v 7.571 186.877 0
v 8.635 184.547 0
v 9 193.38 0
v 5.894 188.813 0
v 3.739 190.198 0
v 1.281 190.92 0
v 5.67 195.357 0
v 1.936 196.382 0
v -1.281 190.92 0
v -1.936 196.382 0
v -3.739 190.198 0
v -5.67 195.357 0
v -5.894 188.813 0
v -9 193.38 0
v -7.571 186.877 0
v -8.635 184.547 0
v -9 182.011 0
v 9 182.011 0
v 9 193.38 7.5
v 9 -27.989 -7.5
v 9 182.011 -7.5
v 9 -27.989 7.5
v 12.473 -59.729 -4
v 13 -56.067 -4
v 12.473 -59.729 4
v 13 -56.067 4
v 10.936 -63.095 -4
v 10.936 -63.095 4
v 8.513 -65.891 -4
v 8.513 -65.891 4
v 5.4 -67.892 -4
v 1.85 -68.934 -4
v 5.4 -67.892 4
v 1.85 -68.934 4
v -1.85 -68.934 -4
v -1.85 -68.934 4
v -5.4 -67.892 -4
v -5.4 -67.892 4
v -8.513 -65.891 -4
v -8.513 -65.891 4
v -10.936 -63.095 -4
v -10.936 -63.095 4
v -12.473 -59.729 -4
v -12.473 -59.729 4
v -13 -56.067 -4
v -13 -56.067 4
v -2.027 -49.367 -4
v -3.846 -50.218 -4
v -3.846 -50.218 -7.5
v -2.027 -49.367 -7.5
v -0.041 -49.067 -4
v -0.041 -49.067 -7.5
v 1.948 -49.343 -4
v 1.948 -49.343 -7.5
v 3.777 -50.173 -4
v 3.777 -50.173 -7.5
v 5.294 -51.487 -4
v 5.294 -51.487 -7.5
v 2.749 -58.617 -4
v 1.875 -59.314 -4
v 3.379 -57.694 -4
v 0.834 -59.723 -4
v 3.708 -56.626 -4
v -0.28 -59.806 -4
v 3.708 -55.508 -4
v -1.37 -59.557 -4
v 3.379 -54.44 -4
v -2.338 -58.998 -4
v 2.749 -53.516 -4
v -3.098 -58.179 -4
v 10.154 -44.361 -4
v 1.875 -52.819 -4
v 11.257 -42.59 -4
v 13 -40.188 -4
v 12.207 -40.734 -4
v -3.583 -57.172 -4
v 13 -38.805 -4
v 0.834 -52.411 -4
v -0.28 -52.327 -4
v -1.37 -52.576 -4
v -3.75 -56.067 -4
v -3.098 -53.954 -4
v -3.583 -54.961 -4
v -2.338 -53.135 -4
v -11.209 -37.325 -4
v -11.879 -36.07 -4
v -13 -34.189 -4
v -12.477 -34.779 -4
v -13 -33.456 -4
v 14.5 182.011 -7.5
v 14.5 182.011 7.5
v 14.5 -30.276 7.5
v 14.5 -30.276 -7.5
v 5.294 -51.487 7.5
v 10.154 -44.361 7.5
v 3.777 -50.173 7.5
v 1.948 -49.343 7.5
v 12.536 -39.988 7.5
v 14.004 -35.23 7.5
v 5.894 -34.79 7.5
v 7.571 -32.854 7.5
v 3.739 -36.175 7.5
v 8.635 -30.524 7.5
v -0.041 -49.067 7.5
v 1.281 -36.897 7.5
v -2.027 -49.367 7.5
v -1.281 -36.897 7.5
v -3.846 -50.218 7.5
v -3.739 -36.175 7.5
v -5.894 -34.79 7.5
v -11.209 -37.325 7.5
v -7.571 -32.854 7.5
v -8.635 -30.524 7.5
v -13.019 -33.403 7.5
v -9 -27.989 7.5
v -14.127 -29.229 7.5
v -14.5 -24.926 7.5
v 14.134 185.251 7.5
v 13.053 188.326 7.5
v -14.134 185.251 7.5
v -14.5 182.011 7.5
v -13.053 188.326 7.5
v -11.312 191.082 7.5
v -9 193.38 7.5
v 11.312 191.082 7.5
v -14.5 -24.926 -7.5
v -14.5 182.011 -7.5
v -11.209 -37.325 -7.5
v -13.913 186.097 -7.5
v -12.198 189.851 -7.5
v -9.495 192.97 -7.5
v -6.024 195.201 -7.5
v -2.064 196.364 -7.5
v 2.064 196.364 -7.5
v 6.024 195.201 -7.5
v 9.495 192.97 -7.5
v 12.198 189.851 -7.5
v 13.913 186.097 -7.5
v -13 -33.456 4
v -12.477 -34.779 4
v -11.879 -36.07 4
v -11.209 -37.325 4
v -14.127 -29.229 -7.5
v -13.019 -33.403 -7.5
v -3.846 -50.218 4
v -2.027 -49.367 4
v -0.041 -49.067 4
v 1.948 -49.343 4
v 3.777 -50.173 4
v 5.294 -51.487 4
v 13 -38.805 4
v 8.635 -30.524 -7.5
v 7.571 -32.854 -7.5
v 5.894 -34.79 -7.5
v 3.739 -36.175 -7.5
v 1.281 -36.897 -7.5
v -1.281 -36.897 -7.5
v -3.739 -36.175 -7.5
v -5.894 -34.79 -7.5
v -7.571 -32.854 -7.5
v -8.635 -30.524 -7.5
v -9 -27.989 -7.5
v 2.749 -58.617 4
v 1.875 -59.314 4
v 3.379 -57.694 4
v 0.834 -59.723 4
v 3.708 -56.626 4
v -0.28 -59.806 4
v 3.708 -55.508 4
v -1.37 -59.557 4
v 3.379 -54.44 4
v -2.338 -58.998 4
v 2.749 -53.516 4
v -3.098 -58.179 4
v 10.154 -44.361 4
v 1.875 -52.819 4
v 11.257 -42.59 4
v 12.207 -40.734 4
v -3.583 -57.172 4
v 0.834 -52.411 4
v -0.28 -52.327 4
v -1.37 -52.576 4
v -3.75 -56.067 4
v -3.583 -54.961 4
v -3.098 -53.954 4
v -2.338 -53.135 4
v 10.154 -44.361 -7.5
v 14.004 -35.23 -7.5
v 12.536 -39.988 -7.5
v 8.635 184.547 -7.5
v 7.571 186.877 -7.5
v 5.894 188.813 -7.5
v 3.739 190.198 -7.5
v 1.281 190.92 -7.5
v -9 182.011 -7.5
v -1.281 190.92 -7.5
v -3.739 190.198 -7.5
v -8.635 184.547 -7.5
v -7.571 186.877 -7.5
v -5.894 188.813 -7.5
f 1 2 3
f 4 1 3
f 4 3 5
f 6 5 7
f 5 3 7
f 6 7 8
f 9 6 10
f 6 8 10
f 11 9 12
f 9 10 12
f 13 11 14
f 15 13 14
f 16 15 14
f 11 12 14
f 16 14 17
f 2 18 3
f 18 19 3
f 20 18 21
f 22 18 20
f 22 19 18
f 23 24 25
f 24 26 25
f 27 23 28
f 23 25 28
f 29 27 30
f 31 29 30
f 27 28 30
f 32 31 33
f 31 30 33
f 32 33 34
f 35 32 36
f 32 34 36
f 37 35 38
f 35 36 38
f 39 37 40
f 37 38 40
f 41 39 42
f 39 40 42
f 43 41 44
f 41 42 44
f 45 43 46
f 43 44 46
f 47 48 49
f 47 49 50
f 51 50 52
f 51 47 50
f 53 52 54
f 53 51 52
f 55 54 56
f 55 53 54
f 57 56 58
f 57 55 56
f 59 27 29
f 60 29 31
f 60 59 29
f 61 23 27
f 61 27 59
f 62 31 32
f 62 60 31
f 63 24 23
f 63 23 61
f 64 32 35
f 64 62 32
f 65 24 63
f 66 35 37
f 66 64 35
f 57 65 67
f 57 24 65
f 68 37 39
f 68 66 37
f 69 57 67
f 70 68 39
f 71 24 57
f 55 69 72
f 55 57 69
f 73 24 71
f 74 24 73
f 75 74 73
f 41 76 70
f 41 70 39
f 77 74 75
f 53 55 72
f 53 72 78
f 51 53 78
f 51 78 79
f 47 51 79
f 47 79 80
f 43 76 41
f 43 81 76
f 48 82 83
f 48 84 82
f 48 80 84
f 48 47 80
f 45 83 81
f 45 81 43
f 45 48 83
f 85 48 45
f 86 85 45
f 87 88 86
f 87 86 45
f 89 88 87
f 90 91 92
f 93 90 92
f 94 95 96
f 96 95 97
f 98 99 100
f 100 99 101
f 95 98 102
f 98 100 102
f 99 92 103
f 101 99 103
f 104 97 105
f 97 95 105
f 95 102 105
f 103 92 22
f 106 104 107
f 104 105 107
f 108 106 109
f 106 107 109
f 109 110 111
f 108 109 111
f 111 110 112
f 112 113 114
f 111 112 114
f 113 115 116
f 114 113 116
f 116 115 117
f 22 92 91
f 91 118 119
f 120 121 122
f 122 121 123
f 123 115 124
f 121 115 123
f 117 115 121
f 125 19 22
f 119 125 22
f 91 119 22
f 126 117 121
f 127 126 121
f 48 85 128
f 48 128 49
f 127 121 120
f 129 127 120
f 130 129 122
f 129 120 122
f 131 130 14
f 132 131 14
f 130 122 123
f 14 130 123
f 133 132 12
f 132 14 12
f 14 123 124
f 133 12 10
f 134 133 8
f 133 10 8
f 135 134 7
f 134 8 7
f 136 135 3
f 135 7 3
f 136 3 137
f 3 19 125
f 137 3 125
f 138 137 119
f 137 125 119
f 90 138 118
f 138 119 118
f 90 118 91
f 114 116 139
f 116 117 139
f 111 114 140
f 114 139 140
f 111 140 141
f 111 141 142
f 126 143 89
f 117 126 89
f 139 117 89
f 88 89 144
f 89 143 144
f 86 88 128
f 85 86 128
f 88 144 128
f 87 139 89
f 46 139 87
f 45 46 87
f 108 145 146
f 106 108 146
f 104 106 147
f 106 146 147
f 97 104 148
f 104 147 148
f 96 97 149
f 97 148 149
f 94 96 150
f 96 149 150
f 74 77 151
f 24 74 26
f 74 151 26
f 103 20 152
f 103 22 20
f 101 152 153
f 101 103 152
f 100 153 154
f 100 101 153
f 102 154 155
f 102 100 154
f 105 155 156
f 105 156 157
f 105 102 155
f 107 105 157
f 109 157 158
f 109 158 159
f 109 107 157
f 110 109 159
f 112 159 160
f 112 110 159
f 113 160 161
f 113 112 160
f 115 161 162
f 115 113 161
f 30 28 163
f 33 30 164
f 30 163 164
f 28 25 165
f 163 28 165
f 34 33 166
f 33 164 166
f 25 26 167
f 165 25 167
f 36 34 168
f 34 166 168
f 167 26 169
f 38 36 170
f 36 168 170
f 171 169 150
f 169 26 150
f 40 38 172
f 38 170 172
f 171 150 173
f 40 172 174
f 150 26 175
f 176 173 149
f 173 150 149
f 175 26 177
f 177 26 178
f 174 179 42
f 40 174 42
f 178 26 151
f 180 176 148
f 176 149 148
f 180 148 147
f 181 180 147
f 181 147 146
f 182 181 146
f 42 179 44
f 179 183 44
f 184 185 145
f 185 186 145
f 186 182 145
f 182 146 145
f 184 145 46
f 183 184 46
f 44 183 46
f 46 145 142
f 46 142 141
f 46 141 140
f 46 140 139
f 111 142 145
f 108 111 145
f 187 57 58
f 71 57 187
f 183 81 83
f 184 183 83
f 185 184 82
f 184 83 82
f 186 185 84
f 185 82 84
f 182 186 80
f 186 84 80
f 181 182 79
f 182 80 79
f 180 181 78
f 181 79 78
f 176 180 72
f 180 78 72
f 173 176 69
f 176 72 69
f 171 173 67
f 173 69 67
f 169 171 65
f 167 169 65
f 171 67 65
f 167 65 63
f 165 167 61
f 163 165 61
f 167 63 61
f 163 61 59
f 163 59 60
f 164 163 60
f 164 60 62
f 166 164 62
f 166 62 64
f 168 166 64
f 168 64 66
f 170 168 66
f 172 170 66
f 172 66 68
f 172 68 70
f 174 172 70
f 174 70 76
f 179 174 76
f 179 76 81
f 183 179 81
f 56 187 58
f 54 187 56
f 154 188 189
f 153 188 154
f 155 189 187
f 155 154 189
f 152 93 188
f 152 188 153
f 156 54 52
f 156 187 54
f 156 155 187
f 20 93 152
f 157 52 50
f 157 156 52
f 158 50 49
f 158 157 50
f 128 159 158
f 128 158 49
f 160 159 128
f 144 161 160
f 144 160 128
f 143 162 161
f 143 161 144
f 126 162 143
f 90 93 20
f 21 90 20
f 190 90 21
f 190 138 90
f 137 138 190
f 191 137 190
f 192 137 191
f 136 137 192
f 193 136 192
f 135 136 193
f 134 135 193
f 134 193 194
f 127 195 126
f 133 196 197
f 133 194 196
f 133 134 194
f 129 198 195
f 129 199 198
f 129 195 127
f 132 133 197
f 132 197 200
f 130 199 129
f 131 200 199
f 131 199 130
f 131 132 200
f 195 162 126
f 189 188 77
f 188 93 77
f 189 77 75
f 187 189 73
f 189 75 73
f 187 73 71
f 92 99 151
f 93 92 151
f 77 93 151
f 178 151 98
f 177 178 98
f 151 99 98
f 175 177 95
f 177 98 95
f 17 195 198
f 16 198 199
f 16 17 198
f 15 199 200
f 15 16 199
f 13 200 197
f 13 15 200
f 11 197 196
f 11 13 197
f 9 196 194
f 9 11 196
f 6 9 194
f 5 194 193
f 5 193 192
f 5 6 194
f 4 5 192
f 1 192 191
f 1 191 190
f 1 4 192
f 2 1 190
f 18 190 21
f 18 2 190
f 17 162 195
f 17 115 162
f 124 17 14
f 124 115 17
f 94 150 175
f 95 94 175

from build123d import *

# Parameters (mm, degrees)
ESTRUSIONE_ESTRUSIONE1_DEPTH = 7.5
ESTRUSIONE_ESTRUSIONE2_DEPTH = 4
TAGLIO_ESTRUSIONE1_DEPTH     = 198.380910943
TAGLIO_ESTRUSIONE2_DEPTH     = 198.380910943
RACCORDO1_R                  = 25
FORO_PER_VITE_M6_5_1_D       = 7.5
TAGLIO_ESTRUSIONE3_DEPTH     = 7.5
TAGLIO_ESTRUSIONE4_DEPTH     = 7.5


with BuildPart() as part:
    # Schizzo1 → Estrusione-Estrusione1 (new, symmetric)
    with BuildSketch(Plane.XY):
        with BuildLine():
            Line((14.5, 182.011383906), (14.5, -37.988616094))
            ThreePointArc((14.5, -37.988616094), (0, -52.488616094), (-14.5, -37.988616094))
            Line((-14.5, -37.988616094), (-14.5, 182.011383906))
            ThreePointArc((-14.5, 182.011383906), (0, 196.511383906), (14.5, 182.011383906))
        make_face()
    extrude(amount=ESTRUSIONE_ESTRUSIONE1_DEPTH, both=True)

    # Schizzo2 → Estrusione-Estrusione2 (add, symmetric)
    with BuildSketch(Plane.XY):
        with BuildLine():
            Line((13, -40.066616094), (13, -56.066616094))
            ThreePointArc((13, -56.066616094), (0, -69.066616094), (-13, -56.066616094))
            Line((-13, -56.066616094), (-13, -40.066616094))
            ThreePointArc((-13, -40.066616094), (0, -27.066616094), (13, -40.066616094))
        make_face()
    extrude(amount=ESTRUSIONE_ESTRUSIONE2_DEPTH, both=True)

    # Schizzo4 → Taglio-Estrusione1 (cut, through all)
    with BuildSketch(Plane.XY.offset(4)):
        with BuildLine():
            Line((5.29445937, -51.487456784), (14.5, -37.988616094))
            Line((14.5, -37.988616094), (21.494330869, -44.738036439))
            Line((21.494330869, -44.738036439), (5.386515672, -60.537124892))
            ThreePointArc((5.386515672, -60.537124892), (0.071202698, -63.066253954), (-5.29445937, -60.645775404))
            Line((-5.29445937, -60.645775404), (-28.596127717, -39.453615031))
            Line((-28.596127717, -39.453615031), (-14.5, -31.562211214))
            Line((-14.5, -31.562211214), (-3.845832517, -50.217721134))
            ThreePointArc((-3.845832517, -50.217721134), (0.963165144, -49.133196093), (5.29445937, -51.487456784))
        make_face()
    taglio_estrusione1 = extrude(amount=TAGLIO_ESTRUSIONE1_DEPTH, mode=Mode.SUBTRACT)

    # Specchia1: Taglio-Estrusione1 across plane
    add(taglio_estrusione1.mirror(Plane.XY), mode=Mode.SUBTRACT)

    # Schizzo5 → Taglio-Estrusione2 (cut, through all)
    with BuildSketch(Plane.XY.offset(4)):
        Polygon((-13, -44.411232383), (-13, -34.188720036), (-15.056335757, -30.588064032), (-15.056335757, -43.619366988), align=None)
        Polygon((13, -44.411232383), (13, -40.188189356), (17.407959402, -33.724436261), (17.407959402, -44.411232383), align=None)
    extrude(amount=-TAGLIO_ESTRUSIONE2_DEPTH, mode=Mode.SUBTRACT)

    # Raccordo1
    # the kernel refuses this fillet: 25 mm, written as the material it takes off along each edge
    with BuildSketch(Plane(origin=(-14.5, -31.562211214, -24.089497944), x_dir=(0.4959240379913526, -0.8683659070589721, 0), z_dir=(0, 0, 1))) as raccordo1_piece_1_section:
        with BuildLine():
            CenterArc((RACCORDO1_R * 0.26543196711, RACCORDO1_R), RACCORDO1_R, 240.269299078, 29.730700922)
            Line((-RACCORDO1_R * 0.230492070882, RACCORDO1_R * 0.131634092941), (0, 0))
            Line((0, 0), (RACCORDO1_R * 0.26543196711, 0))
        make_face()
    raccordo1_piece_1 = extrude(amount=48.178995889, mode=Mode.PRIVATE)
    raccordo1_piece_1 = split(raccordo1_piece_1, bisect_by=Plane(origin=(-13, -35.788331904, -14.044748972), z_dir=(1, 0, 0)), keep=Keep.TOP, mode=Mode.PRIVATE)
    raccordo1_piece_1 = split(raccordo1_piece_1, bisect_by=Plane(origin=(-12.28179921, -35.788331904, -4), z_dir=(0, 0, -1)), keep=Keep.TOP, mode=Mode.PRIVATE)
    add(raccordo1_piece_1, mode=Mode.SUBTRACT)
    with BuildSketch(Plane(origin=(-14.5, -31.562211214, -24.089497944), x_dir=(0.4959240379913526, -0.8683659070589721, 0), z_dir=(0, 0, 1))) as raccordo1_piece_2_section:
        with BuildLine():
            CenterArc((RACCORDO1_R * 0.26543196711, RACCORDO1_R), RACCORDO1_R, 240.269299078, 29.730700922)
            Line((-RACCORDO1_R * 0.230492070882, RACCORDO1_R * 0.131634092941), (0, 0))
            Line((0, 0), (RACCORDO1_R * 0.26543196711, 0))
        make_face()
    raccordo1_piece_2 = extrude(amount=48.178995889, mode=Mode.PRIVATE)
    raccordo1_piece_2 = split(raccordo1_piece_2, bisect_by=Plane(origin=(-13, -30.370530988, -14.044748972), z_dir=(-1, 0, 0)), keep=Keep.TOP, mode=Mode.PRIVATE)
    raccordo1_piece_2 = split(raccordo1_piece_2, bisect_by=Plane(origin=(-14.266276842, -30.370530988, -4), z_dir=(0, 0, -1)), keep=Keep.TOP, mode=Mode.PRIVATE)
    add(raccordo1_piece_2, mode=Mode.SUBTRACT)
    with BuildSketch(Plane(origin=(-14.5, -31.562211214, -24.089497944), x_dir=(0.4959240379913526, -0.8683659070589721, 0), z_dir=(0, 0, 1))) as raccordo1_piece_3_section:
        with BuildLine():
            CenterArc((RACCORDO1_R * 0.26543196711, RACCORDO1_R), RACCORDO1_R, 240.269299078, 29.730700922)
            Line((-RACCORDO1_R * 0.230492070882, RACCORDO1_R * 0.131634092941), (0, 0))
            Line((0, 0), (RACCORDO1_R * 0.26543196711, 0))
        make_face()
    raccordo1_piece_3 = extrude(amount=48.178995889, mode=Mode.PRIVATE)
    raccordo1_piece_3 = split(raccordo1_piece_3, bisect_by=Plane(origin=(-14.266276842, -30.370530988, 4), z_dir=(0, 0, -1)), keep=Keep.TOP, mode=Mode.PRIVATE)
    raccordo1_piece_3 = split(raccordo1_piece_3, bisect_by=Plane(origin=(-13, -30.370530988, 0), z_dir=(-1, 0, 0)), keep=Keep.TOP, mode=Mode.PRIVATE)
    raccordo1_piece_3 = split(raccordo1_piece_3, bisect_by=Plane(origin=(-14.266276842, -30.370530988, -4), z_dir=(0, 0, 1)), keep=Keep.TOP, mode=Mode.PRIVATE)
    add(raccordo1_piece_3, mode=Mode.SUBTRACT)
    with BuildSketch(Plane(origin=(-14.5, -31.562211214, -24.089497944), x_dir=(0.4959240379913526, -0.8683659070589721, 0), z_dir=(0, 0, 1))) as raccordo1_piece_4_section:
        with BuildLine():
            CenterArc((RACCORDO1_R * 0.26543196711, RACCORDO1_R), RACCORDO1_R, 240.269299078, 29.730700922)
            Line((-RACCORDO1_R * 0.230492070882, RACCORDO1_R * 0.131634092941), (0, 0))
            Line((0, 0), (RACCORDO1_R * 0.26543196711, 0))
        make_face()
    raccordo1_piece_4 = extrude(amount=48.178995889, mode=Mode.PRIVATE)
    raccordo1_piece_4 = split(raccordo1_piece_4, bisect_by=Plane(origin=(-12.28179921, -35.788331904, 4), z_dir=(0, 0, 1)), keep=Keep.TOP, mode=Mode.PRIVATE)
    raccordo1_piece_4 = split(raccordo1_piece_4, bisect_by=Plane(origin=(-13, -35.788331904, 14.044748972), z_dir=(1, 0, 0)), keep=Keep.TOP, mode=Mode.PRIVATE)
    add(raccordo1_piece_4, mode=Mode.SUBTRACT)
    with BuildSketch(Plane(origin=(-14.5, -31.562211214, -24.089497944), x_dir=(0.4959240379913526, -0.8683659070589721, 0), z_dir=(0, 0, 1))) as raccordo1_piece_5_section:
        with BuildLine():
            CenterArc((RACCORDO1_R * 0.26543196711, RACCORDO1_R), RACCORDO1_R, 240.269299078, 29.730700922)
            Line((-RACCORDO1_R * 0.230492070882, RACCORDO1_R * 0.131634092941), (0, 0))
            Line((0, 0), (RACCORDO1_R * 0.26543196711, 0))
        make_face()
    raccordo1_piece_5 = extrude(amount=48.178995889, mode=Mode.PRIVATE)
    raccordo1_piece_5 = split(raccordo1_piece_5, bisect_by=Plane(origin=(-14.266276842, -30.370530988, 4), z_dir=(0, 0, 1)), keep=Keep.TOP, mode=Mode.PRIVATE)
    raccordo1_piece_5 = split(raccordo1_piece_5, bisect_by=Plane(origin=(-13, -30.370530988, 14.044748972), z_dir=(-1, 0, 0)), keep=Keep.TOP, mode=Mode.PRIVATE)
    add(raccordo1_piece_5, mode=Mode.SUBTRACT)
    with BuildSketch(Plane(origin=(14.5, -37.988616094, 26.782481556), x_dir=(0, 1, 0), z_dir=(0, 0, -1))) as raccordo1_piece_6_section:
        with BuildLine():
            CenterArc((RACCORDO1_R * 0.308519704891, -RACCORDO1_R), RACCORDO1_R, 90, 34.292050498)
            Line((-RACCORDO1_R * 0.254891721625, -RACCORDO1_R * 0.173823527041), (0, 0))
            Line((0, 0), (RACCORDO1_R * 0.308519704891, 0))
        make_face()
    raccordo1_piece_6 = extrude(amount=53.564963111, mode=Mode.PRIVATE)
    raccordo1_piece_6 = split(raccordo1_piece_6, bisect_by=Plane(origin=(14.242102238, -36.251699178, 4), z_dir=(0, 0, 1)), keep=Keep.TOP, mode=Mode.PRIVATE)
    raccordo1_piece_6 = split(raccordo1_piece_6, bisect_by=Plane(origin=(13, -36.251699178, 15.391240778), z_dir=(1, 0, 0)), keep=Keep.TOP, mode=Mode.PRIVATE)
    add(raccordo1_piece_6, mode=Mode.SUBTRACT)
    with BuildSketch(Plane(origin=(14.5, -37.988616094, 26.782481556), x_dir=(0, 1, 0), z_dir=(0, 0, -1))) as raccordo1_piece_7_section:
        with BuildLine():
            CenterArc((RACCORDO1_R * 0.308519704891, -RACCORDO1_R), RACCORDO1_R, 90, 34.292050498)
            Line((-RACCORDO1_R * 0.254891721625, -RACCORDO1_R * 0.173823527041), (0, 0))
            Line((0, 0), (RACCORDO1_R * 0.308519704891, 0))
        make_face()
    raccordo1_piece_7 = extrude(amount=53.564963111, mode=Mode.PRIVATE)
    raccordo1_piece_7 = split(raccordo1_piece_7, bisect_by=Plane(origin=(11.895384145, -41.966992208, 4), z_dir=(0, 0, 1)), keep=Keep.TOP, mode=Mode.PRIVATE)
    raccordo1_piece_7 = split(raccordo1_piece_7, bisect_by=Plane(origin=(13, -41.966992208, 15.391240778), z_dir=(-1, 0, 0)), keep=Keep.TOP, mode=Mode.PRIVATE)
    add(raccordo1_piece_7, mode=Mode.SUBTRACT)
    with BuildSketch(Plane(origin=(14.5, -37.988616094, 26.782481556), x_dir=(0, 1, 0), z_dir=(0, 0, -1))) as raccordo1_piece_8_section:
        with BuildLine():
            CenterArc((RACCORDO1_R * 0.308519704891, -RACCORDO1_R), RACCORDO1_R, 90, 34.292050498)
            Line((-RACCORDO1_R * 0.254891721625, -RACCORDO1_R * 0.173823527041), (0, 0))
            Line((0, 0), (RACCORDO1_R * 0.308519704891, 0))
        make_face()
    raccordo1_piece_8 = extrude(amount=53.564963111, mode=Mode.PRIVATE)
    raccordo1_piece_8 = split(raccordo1_piece_8, bisect_by=Plane(origin=(14.242102238, -36.251699178, 4), z_dir=(0, 0, -1)), keep=Keep.TOP, mode=Mode.PRIVATE)
    raccordo1_piece_8 = split(raccordo1_piece_8, bisect_by=Plane(origin=(14.242102238, -36.251699178, -4), z_dir=(0, 0, 1)), keep=Keep.TOP, mode=Mode.PRIVATE)
    raccordo1_piece_8 = split(raccordo1_piece_8, bisect_by=Plane(origin=(13, -36.251699178, 0), z_dir=(1, 0, 0)), keep=Keep.TOP, mode=Mode.PRIVATE)
    add(raccordo1_piece_8, mode=Mode.SUBTRACT)
    with BuildSketch(Plane(origin=(14.5, -37.988616094, 26.782481556), x_dir=(0, 1, 0), z_dir=(0, 0, -1))) as raccordo1_piece_9_section:
        with BuildLine():
            CenterArc((RACCORDO1_R * 0.308519704891, -RACCORDO1_R), RACCORDO1_R, 90, 34.292050498)
            Line((-RACCORDO1_R * 0.254891721625, -RACCORDO1_R * 0.173823527041), (0, 0))
            Line((0, 0), (RACCORDO1_R * 0.308519704891, 0))
        make_face()
    raccordo1_piece_9 = extrude(amount=53.564963111, mode=Mode.PRIVATE)
    raccordo1_piece_9 = split(raccordo1_piece_9, bisect_by=Plane(origin=(14.242102238, -36.251699178, -4), z_dir=(0, 0, -1)), keep=Keep.TOP, mode=Mode.PRIVATE)
    raccordo1_piece_9 = split(raccordo1_piece_9, bisect_by=Plane(origin=(13, -36.251699178, -15.391240778), z_dir=(1, 0, 0)), keep=Keep.TOP, mode=Mode.PRIVATE)
    add(raccordo1_piece_9, mode=Mode.SUBTRACT)
    with BuildSketch(Plane(origin=(14.5, -37.988616094, 26.782481556), x_dir=(0, 1, 0), z_dir=(0, 0, -1))) as raccordo1_piece_10_section:
        with BuildLine():
            CenterArc((RACCORDO1_R * 0.308519704891, -RACCORDO1_R), RACCORDO1_R, 90, 34.292050498)
            Line((-RACCORDO1_R * 0.254891721625, -RACCORDO1_R * 0.173823527041), (0, 0))
            Line((0, 0), (RACCORDO1_R * 0.308519704891, 0))
        make_face()
    raccordo1_piece_10 = extrude(amount=53.564963111, mode=Mode.PRIVATE)
    raccordo1_piece_10 = split(raccordo1_piece_10, bisect_by=Plane(origin=(11.895384145, -41.966992208, -4), z_dir=(0, 0, -1)), keep=Keep.TOP, mode=Mode.PRIVATE)
    raccordo1_piece_10 = split(raccordo1_piece_10, bisect_by=Plane(origin=(13, -41.966992208, -15.391240778), z_dir=(-1, 0, 0)), keep=Keep.TOP, mode=Mode.PRIVATE)
    add(raccordo1_piece_10, mode=Mode.SUBTRACT)

    # Foro per Vite M6.5-1 (through all)
    with Locations(Plane(origin=(0, -56.066616094, 4), x_dir=(1, 0, 0), z_dir=(0, 0, 1))):
        with Locations((0, 0)):
            Hole(FORO_PER_VITE_M6_5_1_D / 2)

    # Schizzo8 → Taglio-Estrusione3 (cut, symmetric)
    with BuildSketch(Plane.XY):
        with BuildLine():
            Line((9, 182.011383906), (9, -27.988616094))
            ThreePointArc((9, -27.988616094), (0, -36.988616094), (-9, -27.988616094))
            Line((-9, -27.988616094), (-9, 182.011383906))
            ThreePointArc((-9, 182.011383906), (0, 191.011383906), (9, 182.011383906))
        make_face()
    extrude(amount=TAGLIO_ESTRUSIONE3_DEPTH, both=True, mode=Mode.SUBTRACT)

    # Schizzo9 → Taglio-Estrusione4 (cut)
    with BuildSketch(Plane.XY.offset(7.5)):
        with BuildLine():
            Line((-9, 182.011383906), (-9, 202.011383906))
            ThreePointArc((-9, 202.011383906), (0, 211.011383906), (9, 202.011383906))
            Line((9, 202.011383906), (9, 182.011383906))
            ThreePointArc((9, 182.011383906), (0, 173.011383906), (-9, 182.011383906))
        make_face()
    extrude(amount=-TAGLIO_ESTRUSIONE4_DEPTH, mode=Mode.SUBTRACT)


solid = part.part
